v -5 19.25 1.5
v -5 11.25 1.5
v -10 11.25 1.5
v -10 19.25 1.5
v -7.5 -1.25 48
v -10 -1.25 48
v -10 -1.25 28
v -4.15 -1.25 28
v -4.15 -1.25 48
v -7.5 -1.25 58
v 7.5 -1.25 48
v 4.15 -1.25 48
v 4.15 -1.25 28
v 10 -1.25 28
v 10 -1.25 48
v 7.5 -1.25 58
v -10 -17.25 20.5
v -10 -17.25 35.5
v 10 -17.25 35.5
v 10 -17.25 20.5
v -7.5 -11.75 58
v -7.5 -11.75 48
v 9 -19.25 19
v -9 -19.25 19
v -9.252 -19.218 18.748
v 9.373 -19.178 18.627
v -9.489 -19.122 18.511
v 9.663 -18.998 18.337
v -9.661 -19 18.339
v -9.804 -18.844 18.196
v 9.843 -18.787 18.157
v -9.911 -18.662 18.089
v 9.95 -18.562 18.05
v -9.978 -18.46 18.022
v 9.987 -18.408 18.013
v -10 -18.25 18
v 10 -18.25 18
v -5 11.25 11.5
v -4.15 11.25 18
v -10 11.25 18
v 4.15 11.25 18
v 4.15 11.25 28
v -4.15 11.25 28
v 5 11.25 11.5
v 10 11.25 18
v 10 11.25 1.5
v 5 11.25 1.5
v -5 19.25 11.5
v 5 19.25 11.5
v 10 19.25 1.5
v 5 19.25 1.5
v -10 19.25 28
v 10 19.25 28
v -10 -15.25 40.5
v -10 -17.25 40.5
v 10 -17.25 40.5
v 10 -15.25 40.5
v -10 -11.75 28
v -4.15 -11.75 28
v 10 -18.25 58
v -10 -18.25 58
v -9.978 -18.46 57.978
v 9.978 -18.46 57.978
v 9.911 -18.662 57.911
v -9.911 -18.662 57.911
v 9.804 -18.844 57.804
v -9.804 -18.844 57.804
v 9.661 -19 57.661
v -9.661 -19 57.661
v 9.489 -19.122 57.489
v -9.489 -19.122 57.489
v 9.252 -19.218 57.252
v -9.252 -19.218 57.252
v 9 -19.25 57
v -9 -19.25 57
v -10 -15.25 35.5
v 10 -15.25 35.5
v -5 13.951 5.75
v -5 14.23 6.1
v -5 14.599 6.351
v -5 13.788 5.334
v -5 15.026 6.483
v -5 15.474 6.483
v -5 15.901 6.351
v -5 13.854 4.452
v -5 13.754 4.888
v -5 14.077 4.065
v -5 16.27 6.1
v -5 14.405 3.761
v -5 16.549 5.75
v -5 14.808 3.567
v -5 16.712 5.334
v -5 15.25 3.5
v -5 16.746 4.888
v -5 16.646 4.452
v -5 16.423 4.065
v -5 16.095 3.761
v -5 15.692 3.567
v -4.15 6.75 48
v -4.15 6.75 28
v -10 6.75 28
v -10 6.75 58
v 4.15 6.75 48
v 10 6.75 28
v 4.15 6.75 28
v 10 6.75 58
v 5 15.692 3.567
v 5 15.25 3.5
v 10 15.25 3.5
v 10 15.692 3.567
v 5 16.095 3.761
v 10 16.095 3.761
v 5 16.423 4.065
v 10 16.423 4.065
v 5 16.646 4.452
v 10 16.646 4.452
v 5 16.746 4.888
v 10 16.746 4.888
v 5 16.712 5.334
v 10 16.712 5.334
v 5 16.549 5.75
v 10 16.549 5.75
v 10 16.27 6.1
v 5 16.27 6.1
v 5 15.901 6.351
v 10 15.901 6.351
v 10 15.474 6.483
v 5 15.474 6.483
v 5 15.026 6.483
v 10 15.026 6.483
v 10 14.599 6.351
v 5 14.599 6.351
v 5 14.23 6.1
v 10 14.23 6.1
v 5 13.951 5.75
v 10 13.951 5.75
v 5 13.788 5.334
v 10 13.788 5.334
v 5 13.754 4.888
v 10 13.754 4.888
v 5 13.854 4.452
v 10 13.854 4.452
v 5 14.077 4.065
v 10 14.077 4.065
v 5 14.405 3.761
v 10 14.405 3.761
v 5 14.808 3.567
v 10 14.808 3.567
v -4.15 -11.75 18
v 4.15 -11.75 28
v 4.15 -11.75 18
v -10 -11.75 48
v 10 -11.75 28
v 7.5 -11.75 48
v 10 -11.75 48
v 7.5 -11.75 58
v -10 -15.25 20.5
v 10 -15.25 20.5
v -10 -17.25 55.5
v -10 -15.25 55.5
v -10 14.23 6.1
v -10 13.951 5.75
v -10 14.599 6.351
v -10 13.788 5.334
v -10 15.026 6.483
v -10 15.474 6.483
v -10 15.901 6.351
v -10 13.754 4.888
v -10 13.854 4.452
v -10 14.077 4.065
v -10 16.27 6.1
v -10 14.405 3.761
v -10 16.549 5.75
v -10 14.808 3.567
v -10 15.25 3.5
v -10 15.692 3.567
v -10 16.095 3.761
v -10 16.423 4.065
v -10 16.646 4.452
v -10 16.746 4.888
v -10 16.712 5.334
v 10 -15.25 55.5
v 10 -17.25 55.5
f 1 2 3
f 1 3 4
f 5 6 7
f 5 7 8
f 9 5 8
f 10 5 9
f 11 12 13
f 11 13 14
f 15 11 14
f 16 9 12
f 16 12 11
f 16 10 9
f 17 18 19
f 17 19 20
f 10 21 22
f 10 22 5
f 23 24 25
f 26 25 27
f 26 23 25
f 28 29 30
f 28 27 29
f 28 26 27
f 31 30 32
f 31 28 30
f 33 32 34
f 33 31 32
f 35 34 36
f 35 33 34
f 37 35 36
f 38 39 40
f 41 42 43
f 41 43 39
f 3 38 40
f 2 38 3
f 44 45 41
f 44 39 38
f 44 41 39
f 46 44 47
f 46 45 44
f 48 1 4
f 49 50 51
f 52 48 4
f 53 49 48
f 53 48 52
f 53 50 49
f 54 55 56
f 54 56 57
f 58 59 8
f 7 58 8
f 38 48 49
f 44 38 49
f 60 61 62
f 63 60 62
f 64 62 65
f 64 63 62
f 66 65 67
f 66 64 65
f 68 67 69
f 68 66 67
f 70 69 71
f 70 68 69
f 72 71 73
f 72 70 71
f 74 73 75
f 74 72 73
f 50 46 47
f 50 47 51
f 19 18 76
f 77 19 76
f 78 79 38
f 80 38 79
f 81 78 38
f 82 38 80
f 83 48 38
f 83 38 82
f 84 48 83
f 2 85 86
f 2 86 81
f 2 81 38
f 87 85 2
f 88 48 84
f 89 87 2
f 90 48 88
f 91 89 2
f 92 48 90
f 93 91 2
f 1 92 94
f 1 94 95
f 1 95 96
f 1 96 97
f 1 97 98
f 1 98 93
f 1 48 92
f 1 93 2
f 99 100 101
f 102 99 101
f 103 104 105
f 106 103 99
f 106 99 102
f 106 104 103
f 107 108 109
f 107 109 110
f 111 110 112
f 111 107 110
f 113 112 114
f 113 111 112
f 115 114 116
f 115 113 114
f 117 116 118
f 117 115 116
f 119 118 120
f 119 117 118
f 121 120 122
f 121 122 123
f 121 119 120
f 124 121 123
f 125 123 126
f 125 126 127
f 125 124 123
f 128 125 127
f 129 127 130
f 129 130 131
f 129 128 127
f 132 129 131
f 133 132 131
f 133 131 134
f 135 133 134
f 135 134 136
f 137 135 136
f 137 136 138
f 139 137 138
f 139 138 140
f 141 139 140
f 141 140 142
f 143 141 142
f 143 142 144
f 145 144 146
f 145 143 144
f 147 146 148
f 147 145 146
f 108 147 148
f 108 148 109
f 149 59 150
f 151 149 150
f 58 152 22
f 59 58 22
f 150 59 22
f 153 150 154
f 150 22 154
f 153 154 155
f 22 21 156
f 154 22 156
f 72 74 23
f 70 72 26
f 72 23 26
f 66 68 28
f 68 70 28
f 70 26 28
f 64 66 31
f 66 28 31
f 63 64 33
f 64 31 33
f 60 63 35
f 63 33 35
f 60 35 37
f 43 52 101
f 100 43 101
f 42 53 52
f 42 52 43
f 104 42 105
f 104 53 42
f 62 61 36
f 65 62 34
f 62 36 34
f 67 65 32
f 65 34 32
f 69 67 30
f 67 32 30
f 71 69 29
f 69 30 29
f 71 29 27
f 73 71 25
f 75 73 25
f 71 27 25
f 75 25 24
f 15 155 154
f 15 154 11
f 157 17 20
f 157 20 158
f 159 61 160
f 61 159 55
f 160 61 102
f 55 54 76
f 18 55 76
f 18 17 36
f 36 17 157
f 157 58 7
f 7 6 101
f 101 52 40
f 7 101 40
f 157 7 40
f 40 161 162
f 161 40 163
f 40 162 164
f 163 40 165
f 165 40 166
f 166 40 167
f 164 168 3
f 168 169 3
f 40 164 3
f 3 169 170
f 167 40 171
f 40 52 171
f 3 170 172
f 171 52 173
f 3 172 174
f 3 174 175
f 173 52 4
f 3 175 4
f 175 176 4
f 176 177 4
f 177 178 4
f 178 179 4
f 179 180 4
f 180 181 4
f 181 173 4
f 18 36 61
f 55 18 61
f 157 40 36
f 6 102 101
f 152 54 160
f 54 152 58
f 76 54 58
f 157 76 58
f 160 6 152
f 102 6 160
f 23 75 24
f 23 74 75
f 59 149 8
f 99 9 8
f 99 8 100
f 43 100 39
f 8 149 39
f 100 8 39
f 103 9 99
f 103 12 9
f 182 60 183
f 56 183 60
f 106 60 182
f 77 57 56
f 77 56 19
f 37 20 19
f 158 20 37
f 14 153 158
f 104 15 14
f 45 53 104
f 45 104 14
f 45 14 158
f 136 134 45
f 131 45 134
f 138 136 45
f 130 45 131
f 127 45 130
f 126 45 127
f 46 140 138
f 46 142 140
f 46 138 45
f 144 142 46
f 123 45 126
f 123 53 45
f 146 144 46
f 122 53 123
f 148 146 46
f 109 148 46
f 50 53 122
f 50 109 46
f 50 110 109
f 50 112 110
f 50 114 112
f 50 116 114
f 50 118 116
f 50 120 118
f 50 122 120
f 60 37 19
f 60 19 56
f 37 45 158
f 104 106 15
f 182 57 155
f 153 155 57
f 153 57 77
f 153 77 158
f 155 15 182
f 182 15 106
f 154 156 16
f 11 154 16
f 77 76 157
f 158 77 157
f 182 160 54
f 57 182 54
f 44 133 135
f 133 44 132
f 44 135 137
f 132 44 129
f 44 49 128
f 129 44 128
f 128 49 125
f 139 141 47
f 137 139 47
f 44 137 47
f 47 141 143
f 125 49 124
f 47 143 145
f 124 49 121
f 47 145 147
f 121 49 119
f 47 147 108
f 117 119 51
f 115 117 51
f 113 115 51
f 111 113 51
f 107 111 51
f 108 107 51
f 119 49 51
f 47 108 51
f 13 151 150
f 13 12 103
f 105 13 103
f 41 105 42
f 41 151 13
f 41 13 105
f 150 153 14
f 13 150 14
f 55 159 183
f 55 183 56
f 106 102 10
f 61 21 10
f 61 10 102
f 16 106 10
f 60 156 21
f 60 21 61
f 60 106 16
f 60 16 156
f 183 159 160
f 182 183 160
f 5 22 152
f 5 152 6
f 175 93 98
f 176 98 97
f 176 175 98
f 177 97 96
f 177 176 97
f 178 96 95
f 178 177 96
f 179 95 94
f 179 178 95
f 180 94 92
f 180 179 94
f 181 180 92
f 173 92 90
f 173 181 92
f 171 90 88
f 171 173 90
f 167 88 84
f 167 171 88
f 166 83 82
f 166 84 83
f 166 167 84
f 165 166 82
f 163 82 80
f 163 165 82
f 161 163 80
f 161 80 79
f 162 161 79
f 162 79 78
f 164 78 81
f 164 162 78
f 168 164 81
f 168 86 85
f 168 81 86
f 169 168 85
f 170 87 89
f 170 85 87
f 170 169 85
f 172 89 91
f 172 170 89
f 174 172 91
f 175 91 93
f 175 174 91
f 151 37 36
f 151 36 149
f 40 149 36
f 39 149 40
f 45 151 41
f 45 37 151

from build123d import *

# Parameters (mm, degrees)
CROQUIS1_R                 = 1.5
CROQUIS1_W                 = 20
CROQUIS1_H                 = 10.5
SALIENTE_EXTRUIR1_DEPTH    = 10
CORTAR_EXTRUIR1_REACH      = 72.33
CROQUIS2_W                 = 10
CROQUIS2_H                 = 10
CROQUIS5_W                 = 15
CROQUIS5_H                 = 10.5
CORTAR_EXTRUIR5_DEPTH      = 10
CORTAR_EXTRUIR4_DEPTH      = 62.923844357
CORTAR_EXTRUIR4_DEPTH_BACK = 62.923844357
CROQUIS4_W                 = 15
CROQUIS4_H                 = 2
CORTAR_EXTRUIR3_REACH      = 47.503
CROQUIS3_W                 = 8.3
CROQUIS3_H                 = 23
REDONDEO2_R                = 1


with BuildPart() as part:
    # Croquis1 → Saliente-Extruir1 (new, symmetric)
    with BuildSketch(Plane(origin=(0, 0, 0), x_dir=(0, 0, -1), z_dir=(1, 0, 0))):
        Polygon((-58, 6.75), (-58, -19.25), (-18, -19.25), (-18, -11.75), (-18, 11.25), (-1.5, 11.25), (-1.5, 19.25), (-28, 19.25), (-28, 6.75), align=None)
        with Locations((-5, 15.25)):
            Circle(CROQUIS1_R, mode=Mode.SUBTRACT)
        with Locations((-38, -6.5)):
            Rectangle(CROQUIS1_W, CROQUIS1_H, mode=Mode.SUBTRACT)
    extrude(amount=SALIENTE_EXTRUIR1_DEPTH, both=True)

    # Cortar-Extruir1: up to this face of the body (flat: up to its plane)
    cortar_extruir1_end = Plane(part.part.faces().sort_by_distance((0, 11.25, 9.75))[0])
    # Croquis2 → Cortar-Extruir1 (cut, up to the picked face)
    with BuildSketch(Plane(origin=(0, 19.25, 0), x_dir=(1, 0, 0), z_dir=(0, 1, 0)), mode=Mode.PRIVATE) as cortar_extruir1_sk1:
        with Locations((0, -6.5)):
            Rectangle(CROQUIS2_W, CROQUIS2_H)
    cortar_extruir1_tool1 = split(extrude(cortar_extruir1_sk1.sketch, amount=-CORTAR_EXTRUIR1_REACH, mode=Mode.PRIVATE), bisect_by=cortar_extruir1_end, keep=Keep.BOTH, mode=Mode.PRIVATE)
    add(cortar_extruir1_tool1.solids().sort_by(Axis((0, 19.25, 6.5), (0, -1, 0)))[0], mode=Mode.SUBTRACT)

    # Croquis5 → Cortar-Extruir5 (cut)
    with BuildSketch(Plane.XY.offset(58)):
        with Locations((0, -6.5)):
            Rectangle(CROQUIS5_W, CROQUIS5_H)
    extrude(amount=-CORTAR_EXTRUIR5_DEPTH, mode=Mode.SUBTRACT)

    # Croquis4 → Cortar-Extruir4 (cut, two sides: drawn at the far end of the back side and taken through both)
    with BuildSketch(Plane(origin=(0, 0, 0), x_dir=(0, 0, -1), z_dir=(1, 0, 0)).offset(-CORTAR_EXTRUIR4_DEPTH_BACK)):
        with Locations((-48, -16.25)):
            Rectangle(CROQUIS4_W, CROQUIS4_H)
        with Locations((-28, -16.25)):
            Rectangle(CROQUIS4_W, CROQUIS4_H)
    extrude(amount=CORTAR_EXTRUIR4_DEPTH + CORTAR_EXTRUIR4_DEPTH_BACK, mode=Mode.SUBTRACT)

    # Cortar-Extruir3: up to this face of the body (flat: up to its plane)
    cortar_extruir3_end = Plane(part.part.faces().sort_by_distance((-8.75, -6.5, 48))[0])
    # Croquis3 → Cortar-Extruir3 (cut, up to the picked face)
    with BuildSketch(Plane.XY.offset(18), mode=Mode.PRIVATE) as cortar_extruir3_sk1:
        with Locations((0, -0.25)):
            Rectangle(CROQUIS3_W, CROQUIS3_H)
    cortar_extruir3_tool1 = split(extrude(cortar_extruir3_sk1.sketch, amount=CORTAR_EXTRUIR3_REACH, mode=Mode.PRIVATE), bisect_by=cortar_extruir3_end, keep=Keep.BOTH, mode=Mode.PRIVATE)
    add(cortar_extruir3_tool1.solids().sort_by(Axis((0, -0.25, 18), (0, 0, 1)))[0], mode=Mode.SUBTRACT)

    # Redondeo2
    redondeo2_edges = [part.edges().sort_by_distance(p)[0] for p in [
        (-10, -19.25, 38),
        (0, -19.25, 58),
        (0, -19.25, 18),
        (10, -19.25, 38),
    ]]
    fillet(redondeo2_edges, radius=REDONDEO2_R)


solid = part.part
